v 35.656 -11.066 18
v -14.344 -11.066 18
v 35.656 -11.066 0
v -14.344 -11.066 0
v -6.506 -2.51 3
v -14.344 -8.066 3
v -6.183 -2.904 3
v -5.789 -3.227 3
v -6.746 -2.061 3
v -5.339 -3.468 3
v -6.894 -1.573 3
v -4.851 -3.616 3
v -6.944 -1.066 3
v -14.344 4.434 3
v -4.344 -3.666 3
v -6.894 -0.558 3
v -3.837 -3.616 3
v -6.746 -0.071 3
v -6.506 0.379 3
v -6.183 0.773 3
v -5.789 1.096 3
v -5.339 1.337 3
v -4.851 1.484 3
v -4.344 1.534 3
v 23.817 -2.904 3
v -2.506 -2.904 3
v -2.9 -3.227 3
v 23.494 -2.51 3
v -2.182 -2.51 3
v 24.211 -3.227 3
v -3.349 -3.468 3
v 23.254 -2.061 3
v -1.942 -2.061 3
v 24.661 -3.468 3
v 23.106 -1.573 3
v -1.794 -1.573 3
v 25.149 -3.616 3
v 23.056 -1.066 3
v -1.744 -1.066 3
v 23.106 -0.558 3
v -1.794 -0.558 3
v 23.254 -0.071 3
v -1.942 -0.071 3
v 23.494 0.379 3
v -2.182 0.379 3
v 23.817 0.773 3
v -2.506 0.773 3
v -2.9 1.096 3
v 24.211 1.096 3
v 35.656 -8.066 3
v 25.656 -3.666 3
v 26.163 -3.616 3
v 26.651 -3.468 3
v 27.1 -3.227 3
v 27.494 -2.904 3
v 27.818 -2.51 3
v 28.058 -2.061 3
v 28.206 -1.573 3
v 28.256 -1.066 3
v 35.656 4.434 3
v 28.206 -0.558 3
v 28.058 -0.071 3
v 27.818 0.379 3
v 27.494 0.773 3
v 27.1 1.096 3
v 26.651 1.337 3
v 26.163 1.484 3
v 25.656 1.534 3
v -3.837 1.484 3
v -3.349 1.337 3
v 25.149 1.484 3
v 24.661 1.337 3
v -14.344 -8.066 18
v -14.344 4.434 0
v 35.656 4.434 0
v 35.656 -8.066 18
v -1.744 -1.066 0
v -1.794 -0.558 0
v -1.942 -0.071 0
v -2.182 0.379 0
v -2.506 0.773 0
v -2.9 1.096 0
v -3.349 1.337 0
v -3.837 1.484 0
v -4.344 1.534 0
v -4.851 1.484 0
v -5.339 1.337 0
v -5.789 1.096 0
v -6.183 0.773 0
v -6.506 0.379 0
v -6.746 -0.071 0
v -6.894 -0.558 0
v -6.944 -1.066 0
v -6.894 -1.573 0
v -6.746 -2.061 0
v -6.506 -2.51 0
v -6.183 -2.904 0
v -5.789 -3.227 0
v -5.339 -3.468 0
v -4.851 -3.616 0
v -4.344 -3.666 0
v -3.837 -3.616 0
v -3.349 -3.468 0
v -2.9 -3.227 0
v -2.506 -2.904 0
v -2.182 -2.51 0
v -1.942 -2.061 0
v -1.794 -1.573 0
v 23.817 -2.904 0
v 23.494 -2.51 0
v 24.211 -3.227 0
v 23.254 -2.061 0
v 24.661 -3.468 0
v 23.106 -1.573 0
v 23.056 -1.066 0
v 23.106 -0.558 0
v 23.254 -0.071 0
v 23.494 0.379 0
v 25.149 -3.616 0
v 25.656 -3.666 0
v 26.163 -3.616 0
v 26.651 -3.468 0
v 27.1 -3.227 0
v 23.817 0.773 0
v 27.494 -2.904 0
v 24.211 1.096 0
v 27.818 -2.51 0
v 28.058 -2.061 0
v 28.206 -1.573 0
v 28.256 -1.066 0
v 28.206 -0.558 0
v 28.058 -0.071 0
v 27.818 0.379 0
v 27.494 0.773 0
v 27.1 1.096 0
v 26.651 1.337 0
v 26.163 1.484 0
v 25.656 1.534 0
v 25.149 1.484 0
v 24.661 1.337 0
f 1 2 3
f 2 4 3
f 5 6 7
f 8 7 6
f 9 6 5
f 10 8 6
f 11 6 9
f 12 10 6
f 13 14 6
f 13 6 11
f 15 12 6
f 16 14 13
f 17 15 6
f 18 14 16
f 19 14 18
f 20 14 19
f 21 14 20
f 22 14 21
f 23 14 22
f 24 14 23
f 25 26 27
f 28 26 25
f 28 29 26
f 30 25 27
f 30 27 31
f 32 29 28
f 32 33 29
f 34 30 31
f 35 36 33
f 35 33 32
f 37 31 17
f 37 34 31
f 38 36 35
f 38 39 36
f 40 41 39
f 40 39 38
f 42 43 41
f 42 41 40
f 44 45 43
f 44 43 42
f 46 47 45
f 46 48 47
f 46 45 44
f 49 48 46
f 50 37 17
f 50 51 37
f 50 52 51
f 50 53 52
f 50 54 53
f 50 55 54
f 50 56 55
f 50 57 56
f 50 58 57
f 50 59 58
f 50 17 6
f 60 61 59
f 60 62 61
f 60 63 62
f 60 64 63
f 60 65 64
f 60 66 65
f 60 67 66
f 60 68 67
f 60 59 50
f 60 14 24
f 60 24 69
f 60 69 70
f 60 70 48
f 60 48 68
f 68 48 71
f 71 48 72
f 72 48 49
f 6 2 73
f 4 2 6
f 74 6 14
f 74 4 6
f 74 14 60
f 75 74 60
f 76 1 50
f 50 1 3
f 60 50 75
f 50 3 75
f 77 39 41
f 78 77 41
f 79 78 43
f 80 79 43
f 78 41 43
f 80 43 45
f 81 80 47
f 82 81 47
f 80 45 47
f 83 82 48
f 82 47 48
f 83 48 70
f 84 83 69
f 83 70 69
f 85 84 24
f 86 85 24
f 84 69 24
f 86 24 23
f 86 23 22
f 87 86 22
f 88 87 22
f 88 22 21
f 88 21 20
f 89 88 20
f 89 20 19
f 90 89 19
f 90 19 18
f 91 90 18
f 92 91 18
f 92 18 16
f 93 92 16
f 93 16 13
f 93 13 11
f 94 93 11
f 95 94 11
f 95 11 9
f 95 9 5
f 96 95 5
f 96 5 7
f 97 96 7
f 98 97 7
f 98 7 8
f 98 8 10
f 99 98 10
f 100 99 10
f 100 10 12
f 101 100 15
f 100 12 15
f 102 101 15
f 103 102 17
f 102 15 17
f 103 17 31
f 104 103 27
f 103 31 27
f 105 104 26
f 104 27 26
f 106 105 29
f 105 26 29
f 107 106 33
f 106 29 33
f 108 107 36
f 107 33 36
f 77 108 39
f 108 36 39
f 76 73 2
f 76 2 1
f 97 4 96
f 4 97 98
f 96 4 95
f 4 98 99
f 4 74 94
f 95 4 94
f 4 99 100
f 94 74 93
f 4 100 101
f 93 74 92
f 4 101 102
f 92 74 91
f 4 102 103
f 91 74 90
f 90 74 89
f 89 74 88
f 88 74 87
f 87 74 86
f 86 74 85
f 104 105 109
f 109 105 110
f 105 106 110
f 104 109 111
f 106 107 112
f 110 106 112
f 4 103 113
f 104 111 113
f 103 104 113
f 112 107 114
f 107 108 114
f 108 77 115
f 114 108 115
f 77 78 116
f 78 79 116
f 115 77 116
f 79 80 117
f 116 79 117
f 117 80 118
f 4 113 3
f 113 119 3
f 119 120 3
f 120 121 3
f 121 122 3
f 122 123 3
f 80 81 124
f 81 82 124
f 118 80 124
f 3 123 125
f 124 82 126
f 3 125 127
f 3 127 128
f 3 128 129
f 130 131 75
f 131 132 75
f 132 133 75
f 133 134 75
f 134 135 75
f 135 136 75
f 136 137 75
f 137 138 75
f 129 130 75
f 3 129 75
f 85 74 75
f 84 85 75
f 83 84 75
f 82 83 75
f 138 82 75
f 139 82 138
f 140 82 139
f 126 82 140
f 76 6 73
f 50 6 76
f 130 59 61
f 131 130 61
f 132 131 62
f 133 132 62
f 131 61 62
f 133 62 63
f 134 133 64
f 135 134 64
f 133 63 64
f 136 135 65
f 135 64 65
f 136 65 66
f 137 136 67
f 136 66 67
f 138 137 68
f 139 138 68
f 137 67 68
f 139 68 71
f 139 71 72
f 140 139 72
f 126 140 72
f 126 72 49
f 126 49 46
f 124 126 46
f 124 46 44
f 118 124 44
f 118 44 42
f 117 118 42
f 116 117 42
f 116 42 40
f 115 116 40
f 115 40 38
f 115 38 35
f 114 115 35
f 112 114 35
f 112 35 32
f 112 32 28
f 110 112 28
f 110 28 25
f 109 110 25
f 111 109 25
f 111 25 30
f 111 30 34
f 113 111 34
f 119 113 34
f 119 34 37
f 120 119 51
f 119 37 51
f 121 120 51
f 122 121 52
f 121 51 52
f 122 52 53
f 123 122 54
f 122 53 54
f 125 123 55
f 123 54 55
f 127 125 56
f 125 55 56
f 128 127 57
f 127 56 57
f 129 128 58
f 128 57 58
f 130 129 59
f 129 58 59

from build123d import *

# Parameters (mm, degrees)
IZIM1_W                              = 50
IZIM1_H                              = 18
IZIM1_R                              = 2.001074691
IZIM1_R_2                            = 2.688724503
Y_KSEKLIK_EKSTR_ZYON1_DEPTH          = 3
M5_HELISARMAL_I_IN_Z_VANA_MATKAB_1_D = 5.2
IZIM4_W                              = 50
IZIM4_H                              = 3
Y_KSEKLIK_EKSTR_ZYON2_DEPTH          = 15
IZIM5_W                              = 50
IZIM5_H                              = 2.5
KES_EKSTR_ZYON1_DEPTH                = 15


with BuildPart() as part:
    # Çizim1 → Yükseklik-Ekstrüzyon1 (new body)
    # profile 1 of 3: a face of its own
    with BuildSketch(Plane.XY):
        with Locations((10.655737705, -2.06557377)):
            Rectangle(IZIM1_W, IZIM1_H)
        with Locations((25.655737705, -1.06557377)):
            Circle(IZIM1_R, mode=Mode.SUBTRACT)
        with Locations((-4.344262295, -1.06557377)):
            Circle(IZIM1_R_2, mode=Mode.SUBTRACT)
    # profile 2 of 3: a face of its own
    with BuildSketch(Plane.XY):
        with Locations((25.655737705, -1.06557377)):
            Circle(IZIM1_R)
    # profile 3 of 3: a face of its own
    with BuildSketch(Plane.XY):
        with Locations((-4.344262295, -1.06557377)):
            Circle(IZIM1_R_2)
    extrude(amount=Y_KSEKLIK_EKSTR_ZYON1_DEPTH)

    # M5 Helisarmal için Zıvana matkabı1 (through all)
    with Locations(Plane(origin=(0, 0, 0), x_dir=(-1, 0, 0), z_dir=(0, 0, -1))):
        with Locations((-25.655737705, -1.06557377), (4.344262295, -1.06557377)):
            Hole(M5_HELISARMAL_I_IN_Z_VANA_MATKAB_1_D / 2)

    # Çizim4 → Yükseklik-Ekstrüzyon2 (add)
    with BuildSketch(Plane.XY.offset(3)):
        with Locations((10.655737705, -9.56557377)):
            Rectangle(IZIM4_W, IZIM4_H)
    extrude(amount=Y_KSEKLIK_EKSTR_ZYON2_DEPTH)

    # Çizim5 → Kes-Ekstrüzyon1 (cut)
    with BuildSketch(Plane.XY.offset(3)):
        with Locations((10.655737705, 5.68442623)):
            Rectangle(IZIM5_W, IZIM5_H)
    extrude(amount=-KES_EKSTR_ZYON1_DEPTH, mode=Mode.SUBTRACT)


solid = part.part
